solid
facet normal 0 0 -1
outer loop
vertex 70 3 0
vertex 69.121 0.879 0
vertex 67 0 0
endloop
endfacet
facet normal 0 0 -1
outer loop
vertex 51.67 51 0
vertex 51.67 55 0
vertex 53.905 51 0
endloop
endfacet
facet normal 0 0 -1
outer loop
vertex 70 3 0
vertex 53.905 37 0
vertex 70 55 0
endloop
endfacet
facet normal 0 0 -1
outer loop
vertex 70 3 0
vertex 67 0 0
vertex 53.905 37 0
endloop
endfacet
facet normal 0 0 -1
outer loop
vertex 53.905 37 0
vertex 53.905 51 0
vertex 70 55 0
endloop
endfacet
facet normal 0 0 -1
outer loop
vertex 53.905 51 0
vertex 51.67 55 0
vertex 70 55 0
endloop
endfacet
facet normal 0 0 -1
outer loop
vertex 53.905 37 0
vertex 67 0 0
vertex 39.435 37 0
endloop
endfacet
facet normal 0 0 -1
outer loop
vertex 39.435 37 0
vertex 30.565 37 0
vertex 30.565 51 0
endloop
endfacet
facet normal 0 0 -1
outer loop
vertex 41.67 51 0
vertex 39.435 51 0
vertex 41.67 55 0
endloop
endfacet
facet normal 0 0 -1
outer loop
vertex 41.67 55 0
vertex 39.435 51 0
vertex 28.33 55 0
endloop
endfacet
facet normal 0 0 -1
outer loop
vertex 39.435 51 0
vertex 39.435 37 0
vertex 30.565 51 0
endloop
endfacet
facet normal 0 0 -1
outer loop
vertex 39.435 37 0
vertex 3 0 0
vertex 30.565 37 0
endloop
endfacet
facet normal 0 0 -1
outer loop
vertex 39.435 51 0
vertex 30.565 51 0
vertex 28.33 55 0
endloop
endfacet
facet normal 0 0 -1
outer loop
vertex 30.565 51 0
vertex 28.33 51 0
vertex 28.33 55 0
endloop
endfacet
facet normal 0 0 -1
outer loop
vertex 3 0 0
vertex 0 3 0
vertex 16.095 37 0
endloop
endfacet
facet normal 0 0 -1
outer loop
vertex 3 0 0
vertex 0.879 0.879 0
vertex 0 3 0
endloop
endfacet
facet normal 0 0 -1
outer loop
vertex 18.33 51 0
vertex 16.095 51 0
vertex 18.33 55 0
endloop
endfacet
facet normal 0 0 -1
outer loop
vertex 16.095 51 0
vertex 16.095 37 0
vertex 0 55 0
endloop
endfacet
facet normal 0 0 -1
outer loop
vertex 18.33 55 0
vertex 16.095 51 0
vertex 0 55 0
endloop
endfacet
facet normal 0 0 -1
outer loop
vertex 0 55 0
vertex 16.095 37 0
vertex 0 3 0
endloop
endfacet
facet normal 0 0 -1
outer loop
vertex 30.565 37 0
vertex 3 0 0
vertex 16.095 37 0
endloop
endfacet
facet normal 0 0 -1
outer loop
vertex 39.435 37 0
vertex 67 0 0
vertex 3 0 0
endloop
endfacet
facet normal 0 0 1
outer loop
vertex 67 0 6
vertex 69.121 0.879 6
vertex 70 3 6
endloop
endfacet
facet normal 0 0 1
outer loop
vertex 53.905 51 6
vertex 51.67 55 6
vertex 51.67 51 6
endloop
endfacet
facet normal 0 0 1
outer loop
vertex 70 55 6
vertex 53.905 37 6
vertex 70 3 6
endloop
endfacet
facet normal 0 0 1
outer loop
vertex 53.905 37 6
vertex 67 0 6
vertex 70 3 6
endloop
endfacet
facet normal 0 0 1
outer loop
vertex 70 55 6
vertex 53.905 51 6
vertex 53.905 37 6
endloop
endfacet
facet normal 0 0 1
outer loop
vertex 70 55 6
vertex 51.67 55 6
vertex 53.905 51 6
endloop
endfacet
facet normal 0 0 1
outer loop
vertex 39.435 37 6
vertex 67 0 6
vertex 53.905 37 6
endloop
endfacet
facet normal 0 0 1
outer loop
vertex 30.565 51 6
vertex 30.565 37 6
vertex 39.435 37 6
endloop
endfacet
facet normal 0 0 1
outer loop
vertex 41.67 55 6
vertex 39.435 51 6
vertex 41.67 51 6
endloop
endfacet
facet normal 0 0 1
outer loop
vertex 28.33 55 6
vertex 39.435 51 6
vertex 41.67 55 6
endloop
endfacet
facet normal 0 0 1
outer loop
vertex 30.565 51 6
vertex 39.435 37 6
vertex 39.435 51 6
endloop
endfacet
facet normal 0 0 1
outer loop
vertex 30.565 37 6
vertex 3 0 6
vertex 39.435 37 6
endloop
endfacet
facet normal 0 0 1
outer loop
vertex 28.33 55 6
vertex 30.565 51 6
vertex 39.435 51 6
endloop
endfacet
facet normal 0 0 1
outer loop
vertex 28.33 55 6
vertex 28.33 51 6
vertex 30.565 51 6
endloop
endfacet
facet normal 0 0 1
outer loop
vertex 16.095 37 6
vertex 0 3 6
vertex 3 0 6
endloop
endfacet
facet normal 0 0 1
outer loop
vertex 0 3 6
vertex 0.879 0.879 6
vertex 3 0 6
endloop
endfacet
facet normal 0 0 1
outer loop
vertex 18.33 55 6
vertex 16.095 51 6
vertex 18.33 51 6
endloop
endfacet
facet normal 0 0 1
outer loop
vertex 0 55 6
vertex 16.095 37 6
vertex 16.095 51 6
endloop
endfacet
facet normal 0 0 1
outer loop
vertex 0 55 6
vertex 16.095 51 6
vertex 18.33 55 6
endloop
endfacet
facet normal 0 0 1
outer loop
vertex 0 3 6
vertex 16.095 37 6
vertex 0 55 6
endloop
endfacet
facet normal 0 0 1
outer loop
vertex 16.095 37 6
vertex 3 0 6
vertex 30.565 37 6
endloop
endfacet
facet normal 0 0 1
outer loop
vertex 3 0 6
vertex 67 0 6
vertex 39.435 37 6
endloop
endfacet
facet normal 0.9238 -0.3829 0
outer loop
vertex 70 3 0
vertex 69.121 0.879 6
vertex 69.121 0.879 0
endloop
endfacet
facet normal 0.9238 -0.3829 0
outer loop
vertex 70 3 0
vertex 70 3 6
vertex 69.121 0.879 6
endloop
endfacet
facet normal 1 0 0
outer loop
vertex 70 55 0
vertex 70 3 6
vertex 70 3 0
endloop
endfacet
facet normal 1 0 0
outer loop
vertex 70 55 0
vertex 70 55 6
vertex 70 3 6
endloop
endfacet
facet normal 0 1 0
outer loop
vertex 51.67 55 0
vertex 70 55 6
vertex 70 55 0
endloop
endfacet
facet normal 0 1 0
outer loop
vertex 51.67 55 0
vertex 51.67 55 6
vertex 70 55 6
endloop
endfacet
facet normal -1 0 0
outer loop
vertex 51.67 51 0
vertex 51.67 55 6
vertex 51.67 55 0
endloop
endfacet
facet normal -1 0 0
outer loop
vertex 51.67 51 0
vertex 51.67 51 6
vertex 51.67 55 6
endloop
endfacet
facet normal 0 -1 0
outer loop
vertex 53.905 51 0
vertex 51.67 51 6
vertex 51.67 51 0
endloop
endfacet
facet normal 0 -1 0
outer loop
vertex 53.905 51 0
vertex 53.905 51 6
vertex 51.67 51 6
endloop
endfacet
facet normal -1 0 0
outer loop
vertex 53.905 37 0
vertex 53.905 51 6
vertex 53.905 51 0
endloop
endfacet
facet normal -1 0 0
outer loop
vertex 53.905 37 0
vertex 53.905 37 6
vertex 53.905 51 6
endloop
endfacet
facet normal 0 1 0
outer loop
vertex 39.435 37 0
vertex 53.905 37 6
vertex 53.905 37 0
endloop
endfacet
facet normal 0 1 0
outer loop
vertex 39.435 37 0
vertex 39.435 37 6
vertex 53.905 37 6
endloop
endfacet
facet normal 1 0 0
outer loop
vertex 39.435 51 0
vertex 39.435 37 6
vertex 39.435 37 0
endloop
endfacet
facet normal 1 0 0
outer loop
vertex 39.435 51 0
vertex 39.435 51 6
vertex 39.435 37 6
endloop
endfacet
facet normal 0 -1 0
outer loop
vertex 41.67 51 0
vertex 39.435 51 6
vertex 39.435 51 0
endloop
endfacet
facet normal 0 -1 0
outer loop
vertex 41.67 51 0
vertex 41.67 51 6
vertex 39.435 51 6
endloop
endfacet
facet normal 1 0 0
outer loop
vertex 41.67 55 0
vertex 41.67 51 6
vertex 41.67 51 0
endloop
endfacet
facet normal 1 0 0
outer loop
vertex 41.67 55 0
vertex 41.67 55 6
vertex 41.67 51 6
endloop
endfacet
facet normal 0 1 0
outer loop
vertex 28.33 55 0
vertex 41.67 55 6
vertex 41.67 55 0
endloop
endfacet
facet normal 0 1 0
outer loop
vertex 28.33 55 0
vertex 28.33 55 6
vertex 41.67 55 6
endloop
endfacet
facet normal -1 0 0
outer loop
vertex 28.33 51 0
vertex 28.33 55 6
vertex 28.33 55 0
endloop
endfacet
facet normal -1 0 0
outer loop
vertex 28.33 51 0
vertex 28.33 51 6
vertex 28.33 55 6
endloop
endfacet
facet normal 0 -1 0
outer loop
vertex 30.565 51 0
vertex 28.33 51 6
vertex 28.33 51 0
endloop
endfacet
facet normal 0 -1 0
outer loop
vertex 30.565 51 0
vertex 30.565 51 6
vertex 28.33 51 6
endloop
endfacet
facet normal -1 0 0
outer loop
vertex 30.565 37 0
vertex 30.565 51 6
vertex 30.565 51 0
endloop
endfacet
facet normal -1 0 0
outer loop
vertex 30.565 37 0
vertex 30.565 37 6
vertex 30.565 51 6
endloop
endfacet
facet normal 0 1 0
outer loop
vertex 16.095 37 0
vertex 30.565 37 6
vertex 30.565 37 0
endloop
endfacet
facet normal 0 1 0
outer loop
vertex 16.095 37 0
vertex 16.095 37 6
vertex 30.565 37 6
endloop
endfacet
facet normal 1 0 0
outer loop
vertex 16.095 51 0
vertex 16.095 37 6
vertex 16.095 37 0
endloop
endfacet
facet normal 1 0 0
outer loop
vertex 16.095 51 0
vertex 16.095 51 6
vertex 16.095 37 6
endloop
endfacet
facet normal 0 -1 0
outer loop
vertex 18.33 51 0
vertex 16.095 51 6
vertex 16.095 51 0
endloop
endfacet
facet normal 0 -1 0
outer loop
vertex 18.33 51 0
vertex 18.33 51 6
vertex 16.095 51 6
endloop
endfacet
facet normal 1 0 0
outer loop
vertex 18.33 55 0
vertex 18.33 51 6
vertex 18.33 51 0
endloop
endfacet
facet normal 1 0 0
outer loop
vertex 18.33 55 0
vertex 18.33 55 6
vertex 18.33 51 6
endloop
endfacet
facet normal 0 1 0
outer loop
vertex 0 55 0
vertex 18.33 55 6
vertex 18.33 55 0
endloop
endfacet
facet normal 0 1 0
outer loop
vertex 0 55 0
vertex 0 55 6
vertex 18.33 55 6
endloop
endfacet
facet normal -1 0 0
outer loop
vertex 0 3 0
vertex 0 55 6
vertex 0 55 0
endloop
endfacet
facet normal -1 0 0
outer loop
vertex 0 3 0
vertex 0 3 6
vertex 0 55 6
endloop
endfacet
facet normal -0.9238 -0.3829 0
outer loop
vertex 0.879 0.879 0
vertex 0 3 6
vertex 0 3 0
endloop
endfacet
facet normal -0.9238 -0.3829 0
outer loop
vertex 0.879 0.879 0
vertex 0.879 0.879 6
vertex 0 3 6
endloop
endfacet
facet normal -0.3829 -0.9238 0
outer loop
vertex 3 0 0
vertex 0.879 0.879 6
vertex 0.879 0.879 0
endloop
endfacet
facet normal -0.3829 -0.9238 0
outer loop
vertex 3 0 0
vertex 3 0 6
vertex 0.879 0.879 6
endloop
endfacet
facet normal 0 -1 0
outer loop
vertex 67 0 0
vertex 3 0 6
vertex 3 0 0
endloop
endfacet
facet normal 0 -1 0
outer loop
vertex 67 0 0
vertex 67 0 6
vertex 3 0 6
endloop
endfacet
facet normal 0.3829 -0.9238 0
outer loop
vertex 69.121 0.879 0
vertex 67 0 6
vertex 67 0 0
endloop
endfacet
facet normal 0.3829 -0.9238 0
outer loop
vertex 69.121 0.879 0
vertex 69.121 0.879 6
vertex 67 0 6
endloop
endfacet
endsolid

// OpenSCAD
$fn = 32;

// ----------------------------------------------------------------------
// Window plate: 70 x 55 mm, 2 open windows
// ----------------------------------------------------------------------

// --- parameters (mm) ---
profile_height = 6;       // extrusion height
profile_points = 24;      // points of the closed outline

profile = [[0, 3], [0.879, 0.879], [3, 0], [67, 0], [69.121, 0.879], [70, 3], [70, 55], [51.67, 55], [51.67, 51], [53.905, 51], [53.905, 37], [39.435, 37], [39.435, 51], [41.67, 51], [41.67, 55], [28.33, 55], [28.33, 51], [30.565, 51], [30.565, 37], [16.095, 37], [16.095, 51], [18.33, 51], [18.33, 55], [0, 55]];  // single closed polygon, 24 points, counter clockwise

// --- the one profile operation ---
linear_extrude(height = profile_height) polygon(points = profile);
